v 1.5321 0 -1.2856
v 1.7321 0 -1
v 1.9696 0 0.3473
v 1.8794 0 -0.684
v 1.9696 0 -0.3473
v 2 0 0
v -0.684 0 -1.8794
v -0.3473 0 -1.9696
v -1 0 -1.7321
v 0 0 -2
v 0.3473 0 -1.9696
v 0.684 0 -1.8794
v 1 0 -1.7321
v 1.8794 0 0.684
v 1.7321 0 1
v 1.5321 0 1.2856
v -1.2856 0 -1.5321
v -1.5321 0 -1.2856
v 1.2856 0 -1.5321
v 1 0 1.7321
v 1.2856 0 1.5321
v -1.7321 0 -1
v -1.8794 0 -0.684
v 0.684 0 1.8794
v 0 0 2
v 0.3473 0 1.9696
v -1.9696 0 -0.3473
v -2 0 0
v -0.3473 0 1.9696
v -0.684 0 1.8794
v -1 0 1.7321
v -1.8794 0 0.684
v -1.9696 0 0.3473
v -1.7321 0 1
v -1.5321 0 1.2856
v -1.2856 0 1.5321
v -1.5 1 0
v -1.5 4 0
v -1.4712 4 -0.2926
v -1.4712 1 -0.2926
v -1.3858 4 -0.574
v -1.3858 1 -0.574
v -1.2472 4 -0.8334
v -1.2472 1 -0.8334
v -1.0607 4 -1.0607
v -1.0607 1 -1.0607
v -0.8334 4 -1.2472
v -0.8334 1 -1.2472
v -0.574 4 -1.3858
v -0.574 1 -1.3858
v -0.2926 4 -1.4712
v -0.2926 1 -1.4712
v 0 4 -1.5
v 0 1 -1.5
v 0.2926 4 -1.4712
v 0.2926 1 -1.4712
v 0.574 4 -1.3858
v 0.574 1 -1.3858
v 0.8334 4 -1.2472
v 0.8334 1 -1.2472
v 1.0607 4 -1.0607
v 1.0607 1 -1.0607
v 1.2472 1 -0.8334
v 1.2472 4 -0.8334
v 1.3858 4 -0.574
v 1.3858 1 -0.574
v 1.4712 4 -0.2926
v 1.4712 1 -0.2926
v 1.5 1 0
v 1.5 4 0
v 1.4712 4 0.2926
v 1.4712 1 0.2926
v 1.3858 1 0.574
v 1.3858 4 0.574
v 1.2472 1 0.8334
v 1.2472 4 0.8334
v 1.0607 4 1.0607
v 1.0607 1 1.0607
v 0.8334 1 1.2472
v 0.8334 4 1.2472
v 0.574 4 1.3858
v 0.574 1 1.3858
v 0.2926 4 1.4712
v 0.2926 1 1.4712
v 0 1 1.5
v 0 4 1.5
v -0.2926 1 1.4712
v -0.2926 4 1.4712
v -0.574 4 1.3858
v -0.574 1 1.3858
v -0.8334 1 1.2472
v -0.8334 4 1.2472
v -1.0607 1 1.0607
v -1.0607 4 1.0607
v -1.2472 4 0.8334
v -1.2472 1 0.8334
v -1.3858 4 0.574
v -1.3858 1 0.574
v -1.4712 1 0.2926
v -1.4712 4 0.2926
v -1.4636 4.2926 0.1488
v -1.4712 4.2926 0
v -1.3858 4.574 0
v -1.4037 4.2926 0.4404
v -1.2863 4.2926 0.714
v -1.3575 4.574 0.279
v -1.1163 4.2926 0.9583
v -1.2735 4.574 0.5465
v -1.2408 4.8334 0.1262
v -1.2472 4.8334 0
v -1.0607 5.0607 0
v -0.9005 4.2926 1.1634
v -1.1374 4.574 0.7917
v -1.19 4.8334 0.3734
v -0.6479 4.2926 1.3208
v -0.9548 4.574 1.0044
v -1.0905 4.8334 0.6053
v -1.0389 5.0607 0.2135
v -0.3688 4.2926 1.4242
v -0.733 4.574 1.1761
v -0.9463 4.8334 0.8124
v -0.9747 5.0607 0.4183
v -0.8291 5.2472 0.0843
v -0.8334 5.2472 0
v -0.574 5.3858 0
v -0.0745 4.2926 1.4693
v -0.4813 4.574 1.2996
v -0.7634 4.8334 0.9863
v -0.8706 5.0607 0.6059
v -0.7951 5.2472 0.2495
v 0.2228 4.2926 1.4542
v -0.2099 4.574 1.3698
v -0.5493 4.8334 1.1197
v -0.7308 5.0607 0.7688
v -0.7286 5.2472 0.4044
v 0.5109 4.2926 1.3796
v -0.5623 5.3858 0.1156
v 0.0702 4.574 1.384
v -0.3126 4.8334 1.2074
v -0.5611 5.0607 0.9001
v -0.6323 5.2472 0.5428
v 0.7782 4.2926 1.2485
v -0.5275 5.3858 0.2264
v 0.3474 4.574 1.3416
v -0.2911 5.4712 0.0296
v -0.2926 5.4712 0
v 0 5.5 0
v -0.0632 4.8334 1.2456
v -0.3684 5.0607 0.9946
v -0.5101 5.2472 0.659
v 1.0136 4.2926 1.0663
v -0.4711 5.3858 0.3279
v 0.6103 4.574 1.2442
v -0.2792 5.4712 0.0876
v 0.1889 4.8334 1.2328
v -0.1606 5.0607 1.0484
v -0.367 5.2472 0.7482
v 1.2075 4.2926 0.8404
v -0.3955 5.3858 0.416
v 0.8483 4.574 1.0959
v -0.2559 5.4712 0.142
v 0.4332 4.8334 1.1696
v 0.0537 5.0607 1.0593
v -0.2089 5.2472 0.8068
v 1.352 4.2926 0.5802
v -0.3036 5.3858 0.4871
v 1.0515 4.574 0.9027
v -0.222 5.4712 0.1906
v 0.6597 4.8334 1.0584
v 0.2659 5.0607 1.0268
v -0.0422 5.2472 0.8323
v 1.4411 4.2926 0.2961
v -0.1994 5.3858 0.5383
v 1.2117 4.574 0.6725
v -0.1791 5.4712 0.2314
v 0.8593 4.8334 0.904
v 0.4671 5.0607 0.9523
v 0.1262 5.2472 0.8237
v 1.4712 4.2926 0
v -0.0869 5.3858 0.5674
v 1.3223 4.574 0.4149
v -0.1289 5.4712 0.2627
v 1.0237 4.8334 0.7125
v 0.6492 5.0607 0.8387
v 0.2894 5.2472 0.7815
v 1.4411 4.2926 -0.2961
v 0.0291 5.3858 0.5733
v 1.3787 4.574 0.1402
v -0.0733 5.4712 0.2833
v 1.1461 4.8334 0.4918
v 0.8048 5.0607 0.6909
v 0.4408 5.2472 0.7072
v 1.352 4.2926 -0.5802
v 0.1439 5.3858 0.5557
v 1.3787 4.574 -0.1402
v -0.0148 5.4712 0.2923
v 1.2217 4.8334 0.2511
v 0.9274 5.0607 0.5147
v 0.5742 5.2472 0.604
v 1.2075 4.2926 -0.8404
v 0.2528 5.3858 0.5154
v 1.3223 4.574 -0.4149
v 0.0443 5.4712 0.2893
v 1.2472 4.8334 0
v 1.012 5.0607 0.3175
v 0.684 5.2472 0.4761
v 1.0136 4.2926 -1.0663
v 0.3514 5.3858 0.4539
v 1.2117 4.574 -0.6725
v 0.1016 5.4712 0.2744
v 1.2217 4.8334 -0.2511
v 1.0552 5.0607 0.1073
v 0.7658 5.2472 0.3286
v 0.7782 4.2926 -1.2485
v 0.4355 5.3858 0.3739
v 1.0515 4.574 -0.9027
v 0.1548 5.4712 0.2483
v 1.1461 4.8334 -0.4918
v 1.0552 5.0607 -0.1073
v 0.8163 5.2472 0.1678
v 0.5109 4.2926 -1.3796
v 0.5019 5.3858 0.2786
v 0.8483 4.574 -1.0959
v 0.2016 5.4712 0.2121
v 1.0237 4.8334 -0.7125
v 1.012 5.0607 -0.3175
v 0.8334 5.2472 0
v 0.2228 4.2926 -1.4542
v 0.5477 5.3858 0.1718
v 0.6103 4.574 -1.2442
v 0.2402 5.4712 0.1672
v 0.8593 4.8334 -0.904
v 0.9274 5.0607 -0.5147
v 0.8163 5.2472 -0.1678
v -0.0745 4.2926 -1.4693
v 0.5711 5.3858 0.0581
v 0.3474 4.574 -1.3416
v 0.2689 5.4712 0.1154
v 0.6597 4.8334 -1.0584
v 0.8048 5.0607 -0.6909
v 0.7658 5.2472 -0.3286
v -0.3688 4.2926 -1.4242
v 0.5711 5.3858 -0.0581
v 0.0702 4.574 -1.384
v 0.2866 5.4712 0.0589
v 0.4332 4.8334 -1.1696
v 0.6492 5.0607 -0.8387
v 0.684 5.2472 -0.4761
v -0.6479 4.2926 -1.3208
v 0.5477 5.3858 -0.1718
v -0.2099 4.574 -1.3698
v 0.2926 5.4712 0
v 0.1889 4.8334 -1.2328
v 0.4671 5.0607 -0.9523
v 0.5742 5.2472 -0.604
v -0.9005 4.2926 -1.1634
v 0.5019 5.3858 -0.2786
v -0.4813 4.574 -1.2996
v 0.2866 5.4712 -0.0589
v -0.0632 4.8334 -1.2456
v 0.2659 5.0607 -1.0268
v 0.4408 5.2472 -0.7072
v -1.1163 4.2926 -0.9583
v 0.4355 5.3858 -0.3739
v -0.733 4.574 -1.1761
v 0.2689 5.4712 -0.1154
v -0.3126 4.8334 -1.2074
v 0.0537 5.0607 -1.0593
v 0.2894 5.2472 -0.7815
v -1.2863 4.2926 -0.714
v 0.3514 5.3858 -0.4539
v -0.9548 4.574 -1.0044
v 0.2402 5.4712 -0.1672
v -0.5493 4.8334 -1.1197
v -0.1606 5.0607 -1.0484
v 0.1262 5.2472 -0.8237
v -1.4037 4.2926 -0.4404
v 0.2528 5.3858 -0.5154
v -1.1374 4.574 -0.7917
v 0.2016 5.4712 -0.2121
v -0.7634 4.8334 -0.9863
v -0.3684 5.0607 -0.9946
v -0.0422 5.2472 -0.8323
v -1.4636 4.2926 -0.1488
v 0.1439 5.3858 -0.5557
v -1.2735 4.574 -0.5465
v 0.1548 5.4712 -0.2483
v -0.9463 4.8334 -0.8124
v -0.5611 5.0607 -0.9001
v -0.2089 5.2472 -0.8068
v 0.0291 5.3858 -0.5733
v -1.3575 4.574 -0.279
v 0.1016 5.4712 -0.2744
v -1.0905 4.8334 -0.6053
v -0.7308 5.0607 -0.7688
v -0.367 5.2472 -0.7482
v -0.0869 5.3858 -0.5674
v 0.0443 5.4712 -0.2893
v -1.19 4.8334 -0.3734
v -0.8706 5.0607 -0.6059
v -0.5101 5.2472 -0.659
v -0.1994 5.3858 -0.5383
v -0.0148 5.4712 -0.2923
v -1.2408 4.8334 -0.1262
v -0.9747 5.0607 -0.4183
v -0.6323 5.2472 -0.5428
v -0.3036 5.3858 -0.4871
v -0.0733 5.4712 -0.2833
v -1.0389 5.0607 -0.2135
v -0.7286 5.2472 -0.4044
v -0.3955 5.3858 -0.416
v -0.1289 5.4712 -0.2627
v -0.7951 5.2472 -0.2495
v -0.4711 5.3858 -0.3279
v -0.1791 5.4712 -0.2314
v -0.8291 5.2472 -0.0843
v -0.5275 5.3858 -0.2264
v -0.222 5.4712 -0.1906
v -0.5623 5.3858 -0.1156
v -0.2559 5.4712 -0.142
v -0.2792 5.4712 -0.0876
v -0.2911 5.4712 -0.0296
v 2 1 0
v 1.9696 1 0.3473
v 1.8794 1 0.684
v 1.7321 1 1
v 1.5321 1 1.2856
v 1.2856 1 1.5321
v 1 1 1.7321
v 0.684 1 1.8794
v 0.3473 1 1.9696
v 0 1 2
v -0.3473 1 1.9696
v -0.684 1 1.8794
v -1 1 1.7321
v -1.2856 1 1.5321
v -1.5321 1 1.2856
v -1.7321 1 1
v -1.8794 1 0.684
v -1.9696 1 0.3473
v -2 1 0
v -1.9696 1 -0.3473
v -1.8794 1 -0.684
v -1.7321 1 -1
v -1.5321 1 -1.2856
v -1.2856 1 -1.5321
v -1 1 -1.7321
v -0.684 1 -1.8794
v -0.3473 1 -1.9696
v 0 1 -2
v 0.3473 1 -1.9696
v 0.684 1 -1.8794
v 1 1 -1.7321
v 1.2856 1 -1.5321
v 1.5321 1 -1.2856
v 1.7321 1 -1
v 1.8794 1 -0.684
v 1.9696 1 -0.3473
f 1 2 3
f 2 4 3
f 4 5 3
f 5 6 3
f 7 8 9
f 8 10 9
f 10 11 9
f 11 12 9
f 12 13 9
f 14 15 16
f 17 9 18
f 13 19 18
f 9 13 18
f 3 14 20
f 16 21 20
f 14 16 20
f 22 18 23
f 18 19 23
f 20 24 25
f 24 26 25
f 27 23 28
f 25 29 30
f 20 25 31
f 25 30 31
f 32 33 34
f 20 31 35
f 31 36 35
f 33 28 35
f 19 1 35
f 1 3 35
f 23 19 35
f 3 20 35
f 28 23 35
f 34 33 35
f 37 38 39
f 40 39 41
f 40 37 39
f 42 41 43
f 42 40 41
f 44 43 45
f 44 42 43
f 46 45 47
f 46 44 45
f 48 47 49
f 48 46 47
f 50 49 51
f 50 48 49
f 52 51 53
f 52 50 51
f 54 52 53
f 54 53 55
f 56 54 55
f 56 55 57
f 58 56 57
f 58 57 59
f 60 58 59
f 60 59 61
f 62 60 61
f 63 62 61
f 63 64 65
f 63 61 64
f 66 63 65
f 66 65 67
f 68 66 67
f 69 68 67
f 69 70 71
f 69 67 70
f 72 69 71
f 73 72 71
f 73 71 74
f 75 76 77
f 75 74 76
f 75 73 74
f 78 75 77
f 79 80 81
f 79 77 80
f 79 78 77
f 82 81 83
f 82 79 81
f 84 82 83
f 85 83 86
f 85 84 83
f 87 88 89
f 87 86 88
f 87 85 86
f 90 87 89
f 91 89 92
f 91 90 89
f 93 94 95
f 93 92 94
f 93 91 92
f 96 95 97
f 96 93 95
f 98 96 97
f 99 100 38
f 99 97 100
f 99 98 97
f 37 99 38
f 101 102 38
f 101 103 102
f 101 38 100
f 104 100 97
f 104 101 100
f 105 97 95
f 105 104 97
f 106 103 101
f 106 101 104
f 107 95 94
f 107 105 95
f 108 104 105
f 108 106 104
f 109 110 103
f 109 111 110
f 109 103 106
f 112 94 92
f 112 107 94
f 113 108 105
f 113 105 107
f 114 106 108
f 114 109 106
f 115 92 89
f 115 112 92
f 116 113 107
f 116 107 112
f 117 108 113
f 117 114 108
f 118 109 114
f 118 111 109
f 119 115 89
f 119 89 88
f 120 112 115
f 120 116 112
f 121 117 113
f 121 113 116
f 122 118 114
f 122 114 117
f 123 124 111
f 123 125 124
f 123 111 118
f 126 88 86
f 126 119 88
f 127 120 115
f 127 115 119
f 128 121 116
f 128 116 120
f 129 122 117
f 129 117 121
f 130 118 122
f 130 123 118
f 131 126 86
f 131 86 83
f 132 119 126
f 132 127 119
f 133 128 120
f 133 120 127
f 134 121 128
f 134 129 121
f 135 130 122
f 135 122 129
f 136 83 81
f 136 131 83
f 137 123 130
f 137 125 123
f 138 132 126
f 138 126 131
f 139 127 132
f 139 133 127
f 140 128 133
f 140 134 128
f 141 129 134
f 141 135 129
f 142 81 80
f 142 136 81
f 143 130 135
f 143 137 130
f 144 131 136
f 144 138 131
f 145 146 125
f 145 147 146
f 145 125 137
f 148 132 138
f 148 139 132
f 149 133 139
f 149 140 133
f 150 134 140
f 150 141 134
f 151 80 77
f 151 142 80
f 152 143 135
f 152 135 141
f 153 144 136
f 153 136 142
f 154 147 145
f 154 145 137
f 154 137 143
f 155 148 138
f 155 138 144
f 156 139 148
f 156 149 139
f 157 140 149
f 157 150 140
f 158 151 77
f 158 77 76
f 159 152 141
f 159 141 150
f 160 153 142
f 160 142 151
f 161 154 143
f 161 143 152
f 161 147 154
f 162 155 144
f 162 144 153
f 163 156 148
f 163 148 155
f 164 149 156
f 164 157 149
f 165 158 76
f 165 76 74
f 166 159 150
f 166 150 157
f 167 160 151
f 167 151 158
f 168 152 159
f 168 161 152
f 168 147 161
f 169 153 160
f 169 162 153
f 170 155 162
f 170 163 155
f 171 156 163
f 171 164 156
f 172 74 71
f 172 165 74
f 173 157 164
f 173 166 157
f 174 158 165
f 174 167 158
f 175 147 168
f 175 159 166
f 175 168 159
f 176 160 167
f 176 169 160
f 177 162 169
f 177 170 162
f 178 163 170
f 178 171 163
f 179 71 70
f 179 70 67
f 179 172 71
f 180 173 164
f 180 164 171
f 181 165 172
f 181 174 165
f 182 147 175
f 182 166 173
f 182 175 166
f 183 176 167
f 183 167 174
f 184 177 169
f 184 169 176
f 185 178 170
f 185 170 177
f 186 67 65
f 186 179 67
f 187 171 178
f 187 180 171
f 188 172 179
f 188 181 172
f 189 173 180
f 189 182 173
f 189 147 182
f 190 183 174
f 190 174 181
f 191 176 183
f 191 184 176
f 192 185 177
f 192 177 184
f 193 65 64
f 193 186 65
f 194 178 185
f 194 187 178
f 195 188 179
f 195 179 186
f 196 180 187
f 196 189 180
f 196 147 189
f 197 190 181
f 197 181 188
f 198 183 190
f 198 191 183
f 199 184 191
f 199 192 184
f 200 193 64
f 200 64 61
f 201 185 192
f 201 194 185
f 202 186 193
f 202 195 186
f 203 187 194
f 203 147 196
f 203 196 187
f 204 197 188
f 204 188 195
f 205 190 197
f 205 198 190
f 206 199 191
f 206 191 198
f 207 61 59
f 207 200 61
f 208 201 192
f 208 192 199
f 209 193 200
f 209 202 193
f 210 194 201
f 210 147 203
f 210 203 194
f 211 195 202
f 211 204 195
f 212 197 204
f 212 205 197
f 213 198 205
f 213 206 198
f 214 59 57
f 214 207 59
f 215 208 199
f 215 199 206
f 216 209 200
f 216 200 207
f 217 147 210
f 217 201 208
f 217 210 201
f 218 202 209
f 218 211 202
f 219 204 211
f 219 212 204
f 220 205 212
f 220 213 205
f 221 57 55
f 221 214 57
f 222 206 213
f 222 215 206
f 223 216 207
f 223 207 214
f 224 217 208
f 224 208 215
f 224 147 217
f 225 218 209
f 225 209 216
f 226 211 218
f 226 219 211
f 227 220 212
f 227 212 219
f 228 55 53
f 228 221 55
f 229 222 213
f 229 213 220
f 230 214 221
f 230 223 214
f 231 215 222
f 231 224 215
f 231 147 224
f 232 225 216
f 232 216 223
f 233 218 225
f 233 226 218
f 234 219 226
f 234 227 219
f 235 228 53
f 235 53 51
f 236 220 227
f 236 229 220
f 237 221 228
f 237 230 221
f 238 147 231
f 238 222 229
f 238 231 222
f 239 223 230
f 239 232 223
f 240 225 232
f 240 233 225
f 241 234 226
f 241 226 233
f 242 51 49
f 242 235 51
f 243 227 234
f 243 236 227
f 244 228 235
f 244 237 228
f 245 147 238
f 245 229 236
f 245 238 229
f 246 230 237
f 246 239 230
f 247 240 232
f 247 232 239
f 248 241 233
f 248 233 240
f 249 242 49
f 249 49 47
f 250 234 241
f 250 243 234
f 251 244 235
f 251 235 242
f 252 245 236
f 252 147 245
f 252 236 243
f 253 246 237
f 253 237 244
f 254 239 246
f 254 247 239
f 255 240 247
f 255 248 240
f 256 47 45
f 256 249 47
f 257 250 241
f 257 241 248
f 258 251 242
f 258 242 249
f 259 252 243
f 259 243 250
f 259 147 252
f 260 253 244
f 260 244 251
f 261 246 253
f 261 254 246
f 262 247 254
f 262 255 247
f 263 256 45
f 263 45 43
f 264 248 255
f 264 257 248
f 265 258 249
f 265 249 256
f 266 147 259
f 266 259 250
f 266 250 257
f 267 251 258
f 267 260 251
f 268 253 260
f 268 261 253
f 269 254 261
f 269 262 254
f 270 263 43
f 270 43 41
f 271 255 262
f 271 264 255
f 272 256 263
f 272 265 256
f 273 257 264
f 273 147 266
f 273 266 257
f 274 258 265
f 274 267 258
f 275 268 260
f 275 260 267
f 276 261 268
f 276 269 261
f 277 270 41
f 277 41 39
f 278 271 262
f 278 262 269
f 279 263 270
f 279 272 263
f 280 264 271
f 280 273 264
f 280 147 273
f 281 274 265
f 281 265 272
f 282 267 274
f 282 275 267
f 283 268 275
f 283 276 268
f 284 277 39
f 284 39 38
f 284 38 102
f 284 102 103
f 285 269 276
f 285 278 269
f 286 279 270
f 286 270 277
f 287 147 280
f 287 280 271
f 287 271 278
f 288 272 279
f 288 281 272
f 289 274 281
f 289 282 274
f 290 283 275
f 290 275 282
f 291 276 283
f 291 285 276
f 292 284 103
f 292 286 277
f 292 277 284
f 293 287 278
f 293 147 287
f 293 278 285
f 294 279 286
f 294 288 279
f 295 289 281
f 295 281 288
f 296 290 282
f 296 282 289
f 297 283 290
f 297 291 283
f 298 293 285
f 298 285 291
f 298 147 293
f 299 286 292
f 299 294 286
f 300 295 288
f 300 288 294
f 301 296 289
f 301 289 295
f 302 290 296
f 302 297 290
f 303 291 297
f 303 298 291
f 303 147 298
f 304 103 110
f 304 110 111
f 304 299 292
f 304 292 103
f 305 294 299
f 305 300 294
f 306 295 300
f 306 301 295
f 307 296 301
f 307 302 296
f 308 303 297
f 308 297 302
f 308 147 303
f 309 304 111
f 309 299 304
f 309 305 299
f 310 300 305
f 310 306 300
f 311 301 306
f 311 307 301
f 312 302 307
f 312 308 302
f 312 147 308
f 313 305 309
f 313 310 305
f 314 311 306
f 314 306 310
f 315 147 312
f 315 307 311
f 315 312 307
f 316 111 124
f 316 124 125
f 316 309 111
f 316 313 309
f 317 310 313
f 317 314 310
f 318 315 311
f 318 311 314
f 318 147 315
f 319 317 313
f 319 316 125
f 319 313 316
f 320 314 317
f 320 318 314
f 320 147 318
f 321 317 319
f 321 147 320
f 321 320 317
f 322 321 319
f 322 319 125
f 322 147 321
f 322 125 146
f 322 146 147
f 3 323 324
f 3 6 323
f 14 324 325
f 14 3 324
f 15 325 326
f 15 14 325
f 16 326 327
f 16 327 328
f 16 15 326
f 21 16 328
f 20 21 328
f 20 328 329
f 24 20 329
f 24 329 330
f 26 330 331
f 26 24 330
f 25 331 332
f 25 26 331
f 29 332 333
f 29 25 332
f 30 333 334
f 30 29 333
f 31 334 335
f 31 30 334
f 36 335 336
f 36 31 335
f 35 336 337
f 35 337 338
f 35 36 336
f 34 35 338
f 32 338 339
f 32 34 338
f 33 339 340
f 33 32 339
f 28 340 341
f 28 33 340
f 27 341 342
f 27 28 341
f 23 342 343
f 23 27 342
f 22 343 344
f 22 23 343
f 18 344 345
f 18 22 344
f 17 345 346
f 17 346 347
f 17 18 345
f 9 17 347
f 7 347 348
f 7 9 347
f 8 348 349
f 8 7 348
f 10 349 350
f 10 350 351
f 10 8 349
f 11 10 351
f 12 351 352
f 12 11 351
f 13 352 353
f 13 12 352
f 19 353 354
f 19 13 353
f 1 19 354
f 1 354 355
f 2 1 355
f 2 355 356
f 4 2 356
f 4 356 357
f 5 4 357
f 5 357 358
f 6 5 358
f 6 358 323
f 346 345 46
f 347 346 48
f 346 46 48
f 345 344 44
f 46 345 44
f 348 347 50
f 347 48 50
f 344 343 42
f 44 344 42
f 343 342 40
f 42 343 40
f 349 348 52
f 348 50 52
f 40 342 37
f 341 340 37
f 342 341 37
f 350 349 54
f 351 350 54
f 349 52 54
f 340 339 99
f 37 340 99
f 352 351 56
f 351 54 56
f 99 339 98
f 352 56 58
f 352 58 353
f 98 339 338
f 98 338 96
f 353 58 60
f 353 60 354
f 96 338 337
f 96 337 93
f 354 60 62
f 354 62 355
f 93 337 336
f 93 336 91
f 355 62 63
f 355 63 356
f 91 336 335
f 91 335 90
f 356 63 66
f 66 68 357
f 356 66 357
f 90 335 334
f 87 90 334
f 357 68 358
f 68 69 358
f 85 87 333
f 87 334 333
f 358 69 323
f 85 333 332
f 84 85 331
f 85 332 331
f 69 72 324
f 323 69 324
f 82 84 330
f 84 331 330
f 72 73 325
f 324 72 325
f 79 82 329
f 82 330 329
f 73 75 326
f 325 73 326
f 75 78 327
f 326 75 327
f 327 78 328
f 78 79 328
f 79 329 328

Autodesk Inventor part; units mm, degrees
ref_plane "YZ Plane" through (0, 0, 0) normal (1, 0, 0) x (0, 1, 0)
ref_plane "XZ Plane" through (0, 0, 0) normal (0, 1, 0) x (-1, 0, 0)
ref_plane "XY Plane" through (0, 0, 0) normal (0, 0, 1) x (1, 0, 0)
sketch "Эскиз1" plane through (0, 0, 0) normal (0, 1, 0) x (-1, 0, 0)
  circle A0 centre (0, 0) radius 1.5
  dimension "d0" = 3
extrude "Выдавливание1" add sketch "Эскиз1" along normal blind 5.5
sketch "Эскиз2" plane through (0, 0, 0) normal (0, -1, 0) x (1, 0, 0)
  circle A0 centre (0, 0) radius 2
  dimension "d3" = 4
extrude "Выдавливание2" add sketch "Эскиз2" against normal blind 1
fillet "Сопряжение1" radius 1.5 1 edges at (1.5, 5.5, 0)
properties part number "led_3mm"
